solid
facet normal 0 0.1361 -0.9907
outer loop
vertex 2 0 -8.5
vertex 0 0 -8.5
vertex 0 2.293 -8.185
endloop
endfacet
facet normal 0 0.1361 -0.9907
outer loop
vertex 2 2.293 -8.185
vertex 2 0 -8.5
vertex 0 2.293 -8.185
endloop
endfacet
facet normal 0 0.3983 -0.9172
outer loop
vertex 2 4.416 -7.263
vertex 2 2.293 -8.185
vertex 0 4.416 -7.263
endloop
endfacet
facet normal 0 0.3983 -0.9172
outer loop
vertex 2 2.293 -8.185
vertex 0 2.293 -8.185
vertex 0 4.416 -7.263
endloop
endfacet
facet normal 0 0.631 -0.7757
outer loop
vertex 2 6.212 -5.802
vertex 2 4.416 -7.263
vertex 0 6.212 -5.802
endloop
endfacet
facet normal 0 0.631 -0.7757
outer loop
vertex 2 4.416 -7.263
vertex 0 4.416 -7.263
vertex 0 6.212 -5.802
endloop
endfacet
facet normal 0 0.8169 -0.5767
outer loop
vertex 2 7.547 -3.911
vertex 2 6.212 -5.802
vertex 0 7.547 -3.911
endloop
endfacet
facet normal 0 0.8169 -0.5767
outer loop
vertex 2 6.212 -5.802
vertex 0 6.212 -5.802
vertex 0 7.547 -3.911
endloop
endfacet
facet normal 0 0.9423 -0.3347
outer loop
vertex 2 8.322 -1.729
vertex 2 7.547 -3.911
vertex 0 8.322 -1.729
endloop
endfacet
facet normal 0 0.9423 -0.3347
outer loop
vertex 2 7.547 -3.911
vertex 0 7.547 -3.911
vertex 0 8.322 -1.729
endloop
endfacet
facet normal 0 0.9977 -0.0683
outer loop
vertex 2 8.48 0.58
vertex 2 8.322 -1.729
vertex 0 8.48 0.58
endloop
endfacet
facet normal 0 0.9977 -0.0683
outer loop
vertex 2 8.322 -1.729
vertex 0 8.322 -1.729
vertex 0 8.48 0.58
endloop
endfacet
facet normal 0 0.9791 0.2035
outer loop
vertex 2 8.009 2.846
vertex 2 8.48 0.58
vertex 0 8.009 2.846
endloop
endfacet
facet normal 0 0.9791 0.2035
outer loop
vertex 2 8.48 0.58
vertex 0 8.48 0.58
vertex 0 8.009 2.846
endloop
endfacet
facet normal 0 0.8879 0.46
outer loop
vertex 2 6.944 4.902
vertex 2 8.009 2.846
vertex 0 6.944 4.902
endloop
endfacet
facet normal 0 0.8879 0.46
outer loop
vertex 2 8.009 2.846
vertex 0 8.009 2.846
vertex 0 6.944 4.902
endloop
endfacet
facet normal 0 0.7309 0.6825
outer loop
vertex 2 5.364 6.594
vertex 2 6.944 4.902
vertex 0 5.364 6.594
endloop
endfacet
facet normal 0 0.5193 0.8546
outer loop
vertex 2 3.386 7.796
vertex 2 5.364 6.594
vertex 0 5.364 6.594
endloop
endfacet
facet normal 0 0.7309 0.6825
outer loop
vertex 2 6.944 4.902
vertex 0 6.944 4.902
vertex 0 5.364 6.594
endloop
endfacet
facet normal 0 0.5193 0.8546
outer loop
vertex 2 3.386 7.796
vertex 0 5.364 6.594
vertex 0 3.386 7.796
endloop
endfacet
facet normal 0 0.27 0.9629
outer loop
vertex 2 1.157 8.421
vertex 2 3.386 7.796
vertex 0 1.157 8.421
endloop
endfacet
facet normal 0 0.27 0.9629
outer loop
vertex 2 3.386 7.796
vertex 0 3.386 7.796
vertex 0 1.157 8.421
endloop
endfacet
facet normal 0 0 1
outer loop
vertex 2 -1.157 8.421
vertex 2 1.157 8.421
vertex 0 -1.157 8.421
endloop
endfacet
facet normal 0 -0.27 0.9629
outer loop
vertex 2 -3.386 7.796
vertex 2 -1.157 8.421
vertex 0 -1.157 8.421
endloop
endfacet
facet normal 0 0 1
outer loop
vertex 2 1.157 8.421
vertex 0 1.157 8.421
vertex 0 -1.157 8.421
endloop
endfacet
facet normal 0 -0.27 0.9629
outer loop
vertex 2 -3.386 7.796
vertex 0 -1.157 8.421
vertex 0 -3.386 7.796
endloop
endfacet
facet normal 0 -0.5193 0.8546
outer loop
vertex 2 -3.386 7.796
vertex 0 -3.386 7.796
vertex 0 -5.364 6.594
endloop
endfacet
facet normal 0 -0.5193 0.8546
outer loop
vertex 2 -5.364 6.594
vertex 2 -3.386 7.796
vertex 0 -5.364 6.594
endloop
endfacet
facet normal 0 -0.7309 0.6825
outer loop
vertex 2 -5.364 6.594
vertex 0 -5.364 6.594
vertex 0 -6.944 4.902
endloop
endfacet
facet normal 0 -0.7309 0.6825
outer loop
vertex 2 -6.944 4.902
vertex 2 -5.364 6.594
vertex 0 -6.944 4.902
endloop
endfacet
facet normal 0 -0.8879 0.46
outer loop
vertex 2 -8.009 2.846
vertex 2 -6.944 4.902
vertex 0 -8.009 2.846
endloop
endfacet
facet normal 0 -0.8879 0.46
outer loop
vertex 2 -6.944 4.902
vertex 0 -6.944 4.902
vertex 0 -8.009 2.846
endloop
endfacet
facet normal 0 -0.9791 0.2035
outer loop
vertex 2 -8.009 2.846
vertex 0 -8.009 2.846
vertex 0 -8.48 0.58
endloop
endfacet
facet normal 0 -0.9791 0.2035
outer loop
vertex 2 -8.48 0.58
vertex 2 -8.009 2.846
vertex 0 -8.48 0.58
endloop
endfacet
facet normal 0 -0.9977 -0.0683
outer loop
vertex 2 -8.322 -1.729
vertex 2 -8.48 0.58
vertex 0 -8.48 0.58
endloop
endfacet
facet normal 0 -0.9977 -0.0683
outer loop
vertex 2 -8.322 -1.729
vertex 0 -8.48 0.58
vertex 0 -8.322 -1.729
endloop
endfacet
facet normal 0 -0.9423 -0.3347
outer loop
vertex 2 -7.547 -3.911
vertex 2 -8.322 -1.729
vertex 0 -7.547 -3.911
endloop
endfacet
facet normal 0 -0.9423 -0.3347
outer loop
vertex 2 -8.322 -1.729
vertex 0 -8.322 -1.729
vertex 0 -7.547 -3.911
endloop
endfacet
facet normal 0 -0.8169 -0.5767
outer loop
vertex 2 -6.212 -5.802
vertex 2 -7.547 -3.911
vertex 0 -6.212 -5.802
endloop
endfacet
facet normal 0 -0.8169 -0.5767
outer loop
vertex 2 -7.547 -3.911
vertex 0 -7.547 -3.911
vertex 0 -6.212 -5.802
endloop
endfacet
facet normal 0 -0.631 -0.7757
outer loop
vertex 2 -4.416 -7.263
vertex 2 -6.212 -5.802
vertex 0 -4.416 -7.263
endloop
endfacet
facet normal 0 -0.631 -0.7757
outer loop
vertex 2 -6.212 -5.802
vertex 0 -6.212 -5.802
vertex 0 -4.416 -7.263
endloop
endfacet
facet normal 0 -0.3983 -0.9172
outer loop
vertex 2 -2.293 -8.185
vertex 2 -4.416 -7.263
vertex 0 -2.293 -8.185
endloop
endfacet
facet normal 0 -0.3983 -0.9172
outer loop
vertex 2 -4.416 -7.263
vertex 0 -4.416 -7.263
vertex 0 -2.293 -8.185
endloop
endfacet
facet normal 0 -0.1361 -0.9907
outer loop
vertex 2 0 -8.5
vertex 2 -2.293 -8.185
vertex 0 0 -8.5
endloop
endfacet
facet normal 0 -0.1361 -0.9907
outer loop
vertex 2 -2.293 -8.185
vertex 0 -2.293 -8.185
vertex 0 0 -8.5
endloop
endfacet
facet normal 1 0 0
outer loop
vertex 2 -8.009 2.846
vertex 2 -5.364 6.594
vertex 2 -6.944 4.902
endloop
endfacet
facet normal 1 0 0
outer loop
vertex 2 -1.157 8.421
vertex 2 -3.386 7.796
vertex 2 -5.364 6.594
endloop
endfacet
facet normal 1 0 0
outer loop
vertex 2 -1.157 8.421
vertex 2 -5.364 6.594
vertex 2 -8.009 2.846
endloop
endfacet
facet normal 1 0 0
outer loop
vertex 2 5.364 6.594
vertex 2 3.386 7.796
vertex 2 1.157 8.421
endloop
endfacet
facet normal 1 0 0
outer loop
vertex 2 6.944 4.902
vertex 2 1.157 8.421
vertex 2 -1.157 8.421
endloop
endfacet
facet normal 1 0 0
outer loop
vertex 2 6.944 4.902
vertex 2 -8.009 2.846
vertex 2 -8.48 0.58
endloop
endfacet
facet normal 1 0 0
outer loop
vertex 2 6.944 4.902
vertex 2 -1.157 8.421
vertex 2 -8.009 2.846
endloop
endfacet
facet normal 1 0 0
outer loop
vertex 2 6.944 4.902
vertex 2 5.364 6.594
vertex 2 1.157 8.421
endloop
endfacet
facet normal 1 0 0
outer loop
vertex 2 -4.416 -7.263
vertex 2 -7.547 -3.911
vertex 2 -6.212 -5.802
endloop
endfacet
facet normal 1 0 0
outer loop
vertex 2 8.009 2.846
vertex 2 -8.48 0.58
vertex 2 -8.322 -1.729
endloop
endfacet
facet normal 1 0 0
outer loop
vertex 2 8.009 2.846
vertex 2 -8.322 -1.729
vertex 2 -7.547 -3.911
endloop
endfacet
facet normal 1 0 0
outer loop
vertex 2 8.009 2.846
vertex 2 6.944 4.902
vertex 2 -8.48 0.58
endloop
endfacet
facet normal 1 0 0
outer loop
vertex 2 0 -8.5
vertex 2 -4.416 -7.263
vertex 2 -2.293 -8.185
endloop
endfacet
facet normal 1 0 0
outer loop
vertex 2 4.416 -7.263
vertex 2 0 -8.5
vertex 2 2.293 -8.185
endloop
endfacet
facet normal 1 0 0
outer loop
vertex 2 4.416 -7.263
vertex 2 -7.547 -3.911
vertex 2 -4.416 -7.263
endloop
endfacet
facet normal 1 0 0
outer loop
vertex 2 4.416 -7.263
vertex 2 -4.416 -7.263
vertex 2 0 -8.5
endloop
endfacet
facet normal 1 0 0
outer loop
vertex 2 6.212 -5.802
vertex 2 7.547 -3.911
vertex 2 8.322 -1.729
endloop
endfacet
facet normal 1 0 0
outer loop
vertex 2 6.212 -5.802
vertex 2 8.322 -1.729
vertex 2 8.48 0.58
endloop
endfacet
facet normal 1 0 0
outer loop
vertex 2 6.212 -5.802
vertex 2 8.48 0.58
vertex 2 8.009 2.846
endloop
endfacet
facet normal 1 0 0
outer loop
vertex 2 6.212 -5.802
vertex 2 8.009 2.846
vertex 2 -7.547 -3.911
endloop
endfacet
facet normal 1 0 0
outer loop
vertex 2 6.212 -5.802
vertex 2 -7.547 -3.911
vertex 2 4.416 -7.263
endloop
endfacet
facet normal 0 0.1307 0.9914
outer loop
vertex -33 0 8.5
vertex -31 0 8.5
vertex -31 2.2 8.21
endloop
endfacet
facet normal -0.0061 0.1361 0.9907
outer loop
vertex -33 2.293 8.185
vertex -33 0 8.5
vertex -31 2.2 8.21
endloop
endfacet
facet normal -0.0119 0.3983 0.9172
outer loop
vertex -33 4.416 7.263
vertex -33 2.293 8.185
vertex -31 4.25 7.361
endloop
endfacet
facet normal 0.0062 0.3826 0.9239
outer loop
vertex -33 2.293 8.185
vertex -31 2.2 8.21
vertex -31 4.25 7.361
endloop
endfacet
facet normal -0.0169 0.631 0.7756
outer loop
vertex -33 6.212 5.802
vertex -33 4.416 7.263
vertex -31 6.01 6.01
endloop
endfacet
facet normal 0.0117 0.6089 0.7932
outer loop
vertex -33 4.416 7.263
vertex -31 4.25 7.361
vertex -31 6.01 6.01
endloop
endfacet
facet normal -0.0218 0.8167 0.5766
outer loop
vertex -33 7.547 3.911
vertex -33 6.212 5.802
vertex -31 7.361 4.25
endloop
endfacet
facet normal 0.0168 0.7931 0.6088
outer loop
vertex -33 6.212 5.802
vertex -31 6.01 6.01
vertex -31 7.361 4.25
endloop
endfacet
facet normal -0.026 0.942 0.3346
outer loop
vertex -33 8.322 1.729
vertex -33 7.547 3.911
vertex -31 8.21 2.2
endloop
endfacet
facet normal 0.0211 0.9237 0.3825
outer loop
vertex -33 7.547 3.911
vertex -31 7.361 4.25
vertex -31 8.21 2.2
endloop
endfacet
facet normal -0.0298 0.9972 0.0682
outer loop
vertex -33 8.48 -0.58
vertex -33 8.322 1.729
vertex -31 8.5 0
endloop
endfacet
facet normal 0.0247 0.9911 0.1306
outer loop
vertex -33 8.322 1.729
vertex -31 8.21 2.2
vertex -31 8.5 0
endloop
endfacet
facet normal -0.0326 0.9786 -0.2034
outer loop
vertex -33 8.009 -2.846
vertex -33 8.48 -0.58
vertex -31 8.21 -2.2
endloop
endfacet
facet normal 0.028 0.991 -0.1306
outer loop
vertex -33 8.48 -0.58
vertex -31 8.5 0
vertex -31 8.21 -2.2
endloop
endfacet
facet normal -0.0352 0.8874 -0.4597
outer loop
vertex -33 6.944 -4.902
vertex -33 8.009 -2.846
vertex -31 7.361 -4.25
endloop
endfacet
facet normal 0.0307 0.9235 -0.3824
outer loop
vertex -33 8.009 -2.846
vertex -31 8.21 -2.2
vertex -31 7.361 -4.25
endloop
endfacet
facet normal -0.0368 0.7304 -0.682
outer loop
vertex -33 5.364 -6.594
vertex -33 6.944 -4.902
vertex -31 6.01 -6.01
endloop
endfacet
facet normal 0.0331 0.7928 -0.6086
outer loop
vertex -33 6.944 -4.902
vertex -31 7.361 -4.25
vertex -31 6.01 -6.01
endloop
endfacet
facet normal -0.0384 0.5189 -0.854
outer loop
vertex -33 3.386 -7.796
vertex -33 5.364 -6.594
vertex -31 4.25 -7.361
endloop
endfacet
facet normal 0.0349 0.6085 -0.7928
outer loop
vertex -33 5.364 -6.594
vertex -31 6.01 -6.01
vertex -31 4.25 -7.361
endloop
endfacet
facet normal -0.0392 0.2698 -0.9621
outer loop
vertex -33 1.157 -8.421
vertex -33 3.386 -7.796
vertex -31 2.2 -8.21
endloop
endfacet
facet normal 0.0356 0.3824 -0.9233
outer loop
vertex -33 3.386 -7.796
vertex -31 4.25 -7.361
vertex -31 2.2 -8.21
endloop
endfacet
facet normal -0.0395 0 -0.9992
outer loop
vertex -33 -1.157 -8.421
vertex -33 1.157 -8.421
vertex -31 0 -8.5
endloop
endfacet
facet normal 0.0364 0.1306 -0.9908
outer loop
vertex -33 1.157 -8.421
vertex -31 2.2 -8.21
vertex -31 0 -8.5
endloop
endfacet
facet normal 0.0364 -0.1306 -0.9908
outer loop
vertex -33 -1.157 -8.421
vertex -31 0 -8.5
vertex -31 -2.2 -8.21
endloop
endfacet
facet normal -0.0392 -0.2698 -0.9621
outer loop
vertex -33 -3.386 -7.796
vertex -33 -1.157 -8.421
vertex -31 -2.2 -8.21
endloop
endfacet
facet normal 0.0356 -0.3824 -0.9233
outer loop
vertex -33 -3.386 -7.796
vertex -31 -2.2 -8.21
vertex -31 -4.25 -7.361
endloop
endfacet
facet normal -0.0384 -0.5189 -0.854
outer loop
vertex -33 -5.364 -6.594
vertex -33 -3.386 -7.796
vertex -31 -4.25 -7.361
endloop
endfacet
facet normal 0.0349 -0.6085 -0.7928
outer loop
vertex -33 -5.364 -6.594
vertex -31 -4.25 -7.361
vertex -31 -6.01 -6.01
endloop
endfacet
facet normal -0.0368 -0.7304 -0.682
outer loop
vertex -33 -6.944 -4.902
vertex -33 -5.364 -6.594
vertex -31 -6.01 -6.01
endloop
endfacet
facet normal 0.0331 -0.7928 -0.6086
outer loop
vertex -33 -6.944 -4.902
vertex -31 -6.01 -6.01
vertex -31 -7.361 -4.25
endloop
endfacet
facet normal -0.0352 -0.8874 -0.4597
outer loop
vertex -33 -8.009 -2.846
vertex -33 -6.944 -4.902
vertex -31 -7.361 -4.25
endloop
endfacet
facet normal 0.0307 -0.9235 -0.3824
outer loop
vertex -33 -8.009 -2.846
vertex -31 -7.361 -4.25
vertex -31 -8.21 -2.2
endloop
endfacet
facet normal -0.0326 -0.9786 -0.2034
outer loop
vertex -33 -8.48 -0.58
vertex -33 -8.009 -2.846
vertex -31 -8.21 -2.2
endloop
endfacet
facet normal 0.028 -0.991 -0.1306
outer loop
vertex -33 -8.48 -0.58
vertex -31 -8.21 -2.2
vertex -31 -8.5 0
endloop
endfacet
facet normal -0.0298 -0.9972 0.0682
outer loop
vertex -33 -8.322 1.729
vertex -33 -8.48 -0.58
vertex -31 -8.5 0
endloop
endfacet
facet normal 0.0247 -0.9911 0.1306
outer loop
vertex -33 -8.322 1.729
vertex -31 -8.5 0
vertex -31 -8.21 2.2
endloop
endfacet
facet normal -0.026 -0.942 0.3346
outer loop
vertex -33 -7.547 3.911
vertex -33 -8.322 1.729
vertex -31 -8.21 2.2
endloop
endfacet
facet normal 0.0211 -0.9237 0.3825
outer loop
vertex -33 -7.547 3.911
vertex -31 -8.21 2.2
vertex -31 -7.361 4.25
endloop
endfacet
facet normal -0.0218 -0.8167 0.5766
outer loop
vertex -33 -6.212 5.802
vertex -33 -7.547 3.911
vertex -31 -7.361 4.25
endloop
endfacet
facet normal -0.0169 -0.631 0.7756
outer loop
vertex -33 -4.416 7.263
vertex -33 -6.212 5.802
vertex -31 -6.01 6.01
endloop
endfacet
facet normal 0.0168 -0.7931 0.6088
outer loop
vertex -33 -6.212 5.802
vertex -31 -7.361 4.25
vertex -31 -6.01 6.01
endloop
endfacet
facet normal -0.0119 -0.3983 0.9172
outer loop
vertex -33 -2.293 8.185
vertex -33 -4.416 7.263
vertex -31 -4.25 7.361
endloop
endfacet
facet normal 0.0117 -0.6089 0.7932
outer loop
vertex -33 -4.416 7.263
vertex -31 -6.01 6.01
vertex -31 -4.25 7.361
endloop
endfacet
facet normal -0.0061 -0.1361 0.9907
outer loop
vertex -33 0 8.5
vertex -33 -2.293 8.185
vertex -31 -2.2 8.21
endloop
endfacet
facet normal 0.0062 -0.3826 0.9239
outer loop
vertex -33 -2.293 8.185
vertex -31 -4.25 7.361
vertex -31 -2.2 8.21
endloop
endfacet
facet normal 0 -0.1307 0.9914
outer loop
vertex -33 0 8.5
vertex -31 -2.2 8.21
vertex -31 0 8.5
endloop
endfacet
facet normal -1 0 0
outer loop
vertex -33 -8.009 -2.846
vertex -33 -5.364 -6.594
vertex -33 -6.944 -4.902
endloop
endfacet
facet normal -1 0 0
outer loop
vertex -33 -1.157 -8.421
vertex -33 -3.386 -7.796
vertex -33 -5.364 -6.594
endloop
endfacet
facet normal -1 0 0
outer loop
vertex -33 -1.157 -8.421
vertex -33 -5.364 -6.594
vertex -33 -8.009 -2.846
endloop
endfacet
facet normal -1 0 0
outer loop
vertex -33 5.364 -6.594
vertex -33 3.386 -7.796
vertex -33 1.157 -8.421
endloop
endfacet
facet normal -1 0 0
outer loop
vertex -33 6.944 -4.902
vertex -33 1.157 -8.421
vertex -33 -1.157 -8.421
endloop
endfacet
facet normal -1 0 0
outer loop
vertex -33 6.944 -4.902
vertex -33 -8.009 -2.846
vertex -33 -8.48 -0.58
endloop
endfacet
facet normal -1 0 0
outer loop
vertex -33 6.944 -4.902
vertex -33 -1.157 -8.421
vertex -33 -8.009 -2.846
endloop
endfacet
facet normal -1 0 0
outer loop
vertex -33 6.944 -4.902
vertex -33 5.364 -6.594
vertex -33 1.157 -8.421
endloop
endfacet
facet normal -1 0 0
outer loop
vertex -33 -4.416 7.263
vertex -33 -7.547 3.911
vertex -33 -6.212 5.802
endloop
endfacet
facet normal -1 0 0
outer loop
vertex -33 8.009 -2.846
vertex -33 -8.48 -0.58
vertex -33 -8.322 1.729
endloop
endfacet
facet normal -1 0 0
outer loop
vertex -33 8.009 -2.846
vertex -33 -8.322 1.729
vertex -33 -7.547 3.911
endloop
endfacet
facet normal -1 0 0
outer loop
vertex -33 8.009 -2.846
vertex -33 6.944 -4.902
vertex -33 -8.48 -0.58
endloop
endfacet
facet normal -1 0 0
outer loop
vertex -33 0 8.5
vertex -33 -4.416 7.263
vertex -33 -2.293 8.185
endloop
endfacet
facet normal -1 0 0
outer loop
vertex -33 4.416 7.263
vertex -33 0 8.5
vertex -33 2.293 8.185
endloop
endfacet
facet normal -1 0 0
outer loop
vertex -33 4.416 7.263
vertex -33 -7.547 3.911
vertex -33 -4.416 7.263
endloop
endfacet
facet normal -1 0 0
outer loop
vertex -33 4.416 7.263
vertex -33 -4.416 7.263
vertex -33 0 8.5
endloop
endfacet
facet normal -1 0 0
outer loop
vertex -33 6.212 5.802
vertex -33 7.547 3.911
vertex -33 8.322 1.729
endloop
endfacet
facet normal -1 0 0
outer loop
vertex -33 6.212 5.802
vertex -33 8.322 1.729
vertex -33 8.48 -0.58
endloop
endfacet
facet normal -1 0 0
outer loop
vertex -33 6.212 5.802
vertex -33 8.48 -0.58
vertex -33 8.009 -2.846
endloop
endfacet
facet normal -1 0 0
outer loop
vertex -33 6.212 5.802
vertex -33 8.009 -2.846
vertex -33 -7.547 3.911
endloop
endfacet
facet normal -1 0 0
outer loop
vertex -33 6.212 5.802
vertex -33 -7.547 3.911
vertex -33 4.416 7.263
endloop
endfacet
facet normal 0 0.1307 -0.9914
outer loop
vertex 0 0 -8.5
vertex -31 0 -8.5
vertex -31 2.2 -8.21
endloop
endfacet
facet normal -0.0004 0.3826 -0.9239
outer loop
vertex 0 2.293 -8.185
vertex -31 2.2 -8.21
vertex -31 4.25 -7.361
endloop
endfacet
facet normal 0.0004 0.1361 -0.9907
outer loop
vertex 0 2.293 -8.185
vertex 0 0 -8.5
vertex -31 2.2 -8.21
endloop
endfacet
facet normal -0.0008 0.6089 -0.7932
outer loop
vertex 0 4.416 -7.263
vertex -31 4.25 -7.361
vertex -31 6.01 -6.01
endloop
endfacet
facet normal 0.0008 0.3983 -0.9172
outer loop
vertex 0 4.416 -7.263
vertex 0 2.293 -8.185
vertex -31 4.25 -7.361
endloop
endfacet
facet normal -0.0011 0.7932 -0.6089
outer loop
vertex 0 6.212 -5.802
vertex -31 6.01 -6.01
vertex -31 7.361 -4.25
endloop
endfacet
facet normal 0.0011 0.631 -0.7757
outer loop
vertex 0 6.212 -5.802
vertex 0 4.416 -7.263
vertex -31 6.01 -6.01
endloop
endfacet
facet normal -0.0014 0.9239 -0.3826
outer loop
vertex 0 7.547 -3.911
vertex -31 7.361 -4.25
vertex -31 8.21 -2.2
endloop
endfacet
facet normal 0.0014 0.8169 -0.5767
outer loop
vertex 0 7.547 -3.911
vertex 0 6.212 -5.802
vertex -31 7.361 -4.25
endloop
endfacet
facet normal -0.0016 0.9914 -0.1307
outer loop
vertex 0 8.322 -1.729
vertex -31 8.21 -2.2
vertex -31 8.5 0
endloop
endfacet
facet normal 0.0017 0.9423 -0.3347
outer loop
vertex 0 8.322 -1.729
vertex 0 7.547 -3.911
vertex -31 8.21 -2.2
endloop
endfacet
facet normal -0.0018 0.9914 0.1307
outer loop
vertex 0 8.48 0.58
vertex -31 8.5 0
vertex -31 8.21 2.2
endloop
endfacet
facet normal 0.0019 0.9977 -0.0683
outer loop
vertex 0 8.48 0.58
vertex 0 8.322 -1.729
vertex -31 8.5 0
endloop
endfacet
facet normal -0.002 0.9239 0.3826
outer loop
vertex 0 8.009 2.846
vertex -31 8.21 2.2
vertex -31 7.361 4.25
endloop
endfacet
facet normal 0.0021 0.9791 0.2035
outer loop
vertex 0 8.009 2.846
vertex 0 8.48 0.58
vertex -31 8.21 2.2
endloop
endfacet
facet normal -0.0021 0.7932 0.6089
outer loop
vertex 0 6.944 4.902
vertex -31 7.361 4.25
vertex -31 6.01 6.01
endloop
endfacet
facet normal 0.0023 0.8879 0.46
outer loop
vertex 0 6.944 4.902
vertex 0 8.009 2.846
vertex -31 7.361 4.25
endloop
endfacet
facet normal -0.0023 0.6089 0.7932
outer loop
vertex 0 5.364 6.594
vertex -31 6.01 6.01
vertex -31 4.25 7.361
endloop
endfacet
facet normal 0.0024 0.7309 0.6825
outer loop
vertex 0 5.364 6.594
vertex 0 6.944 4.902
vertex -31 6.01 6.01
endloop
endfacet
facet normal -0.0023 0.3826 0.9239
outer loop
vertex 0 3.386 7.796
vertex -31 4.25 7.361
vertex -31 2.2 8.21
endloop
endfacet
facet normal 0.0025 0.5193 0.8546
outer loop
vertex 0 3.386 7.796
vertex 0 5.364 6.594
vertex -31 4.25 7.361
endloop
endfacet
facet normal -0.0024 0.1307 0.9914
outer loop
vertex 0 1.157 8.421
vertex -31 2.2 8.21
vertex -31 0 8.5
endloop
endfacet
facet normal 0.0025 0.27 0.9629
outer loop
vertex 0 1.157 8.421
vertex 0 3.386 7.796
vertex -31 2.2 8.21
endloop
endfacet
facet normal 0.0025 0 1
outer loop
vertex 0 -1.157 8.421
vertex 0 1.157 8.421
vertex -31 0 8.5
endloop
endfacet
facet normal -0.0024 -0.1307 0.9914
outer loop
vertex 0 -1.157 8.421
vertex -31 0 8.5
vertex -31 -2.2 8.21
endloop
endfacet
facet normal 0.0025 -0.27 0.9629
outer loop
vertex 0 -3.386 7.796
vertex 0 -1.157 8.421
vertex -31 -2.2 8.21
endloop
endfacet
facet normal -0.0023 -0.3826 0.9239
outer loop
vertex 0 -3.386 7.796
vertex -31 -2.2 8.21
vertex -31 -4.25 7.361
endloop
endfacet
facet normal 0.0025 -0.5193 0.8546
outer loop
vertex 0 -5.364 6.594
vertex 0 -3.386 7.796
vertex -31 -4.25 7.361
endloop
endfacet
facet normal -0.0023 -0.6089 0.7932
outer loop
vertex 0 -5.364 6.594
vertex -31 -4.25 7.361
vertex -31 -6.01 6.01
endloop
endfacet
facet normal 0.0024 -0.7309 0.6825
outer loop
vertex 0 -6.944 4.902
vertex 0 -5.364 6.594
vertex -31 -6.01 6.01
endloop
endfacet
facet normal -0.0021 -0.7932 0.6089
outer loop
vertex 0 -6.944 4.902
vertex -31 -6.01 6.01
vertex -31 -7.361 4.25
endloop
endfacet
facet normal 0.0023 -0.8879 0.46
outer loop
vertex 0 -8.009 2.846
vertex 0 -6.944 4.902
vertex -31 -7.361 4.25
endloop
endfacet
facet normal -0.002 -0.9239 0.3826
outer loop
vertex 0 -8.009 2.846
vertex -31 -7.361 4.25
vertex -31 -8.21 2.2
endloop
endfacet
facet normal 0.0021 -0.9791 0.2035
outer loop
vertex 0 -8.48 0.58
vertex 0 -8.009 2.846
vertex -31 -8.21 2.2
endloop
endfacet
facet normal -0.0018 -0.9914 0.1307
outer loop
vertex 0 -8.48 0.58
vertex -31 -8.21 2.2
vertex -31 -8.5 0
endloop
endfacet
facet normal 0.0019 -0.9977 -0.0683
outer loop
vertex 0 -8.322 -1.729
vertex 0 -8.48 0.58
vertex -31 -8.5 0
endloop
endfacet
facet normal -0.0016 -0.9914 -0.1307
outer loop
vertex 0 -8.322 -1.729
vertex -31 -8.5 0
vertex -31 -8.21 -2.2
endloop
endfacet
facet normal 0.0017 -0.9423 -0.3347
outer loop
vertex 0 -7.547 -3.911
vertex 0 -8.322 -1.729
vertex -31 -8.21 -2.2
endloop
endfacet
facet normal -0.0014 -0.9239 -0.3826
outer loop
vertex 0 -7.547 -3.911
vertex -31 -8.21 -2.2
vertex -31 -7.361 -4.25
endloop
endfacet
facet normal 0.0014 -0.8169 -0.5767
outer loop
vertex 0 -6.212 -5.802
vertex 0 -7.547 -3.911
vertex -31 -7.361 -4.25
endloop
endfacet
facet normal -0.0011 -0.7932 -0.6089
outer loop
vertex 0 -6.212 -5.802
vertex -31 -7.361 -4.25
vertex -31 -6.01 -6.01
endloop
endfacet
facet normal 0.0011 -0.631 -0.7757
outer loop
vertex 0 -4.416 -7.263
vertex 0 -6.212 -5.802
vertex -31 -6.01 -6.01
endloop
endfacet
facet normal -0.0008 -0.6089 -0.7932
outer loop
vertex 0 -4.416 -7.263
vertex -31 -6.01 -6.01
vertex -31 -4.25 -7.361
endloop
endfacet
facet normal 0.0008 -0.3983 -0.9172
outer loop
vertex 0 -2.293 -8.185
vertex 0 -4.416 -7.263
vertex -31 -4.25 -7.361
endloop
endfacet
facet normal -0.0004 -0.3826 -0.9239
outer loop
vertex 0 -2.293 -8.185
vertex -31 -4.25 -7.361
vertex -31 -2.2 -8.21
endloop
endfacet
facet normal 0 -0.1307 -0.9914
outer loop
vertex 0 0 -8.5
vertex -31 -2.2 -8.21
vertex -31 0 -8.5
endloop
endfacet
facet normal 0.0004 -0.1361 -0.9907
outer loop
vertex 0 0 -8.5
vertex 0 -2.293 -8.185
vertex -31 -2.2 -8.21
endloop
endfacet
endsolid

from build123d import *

# Parameters (mm, degrees)
SKETCH1_R           = 8.5
BOSS_EXTRUDE1_DEPTH = 31
SKETCH1_2_R         = 8.5
BOSS_EXTRUDE2_DEPTH = 2
SKETCH2_R           = 8.5
BOSS_EXTRUDE3_DEPTH = 2


with BuildPart() as part:
    # Sketch1 → Boss-Extrude1 (new body)
    with BuildSketch(Plane(origin=(0, 0, 0), x_dir=(0, 0, -1), z_dir=(1, 0, 0))):
        Circle(SKETCH1_R)
    extrude(amount=-BOSS_EXTRUDE1_DEPTH)

    # Sketch1<2> → Boss-Extrude2 (add)
    with BuildSketch(Plane(origin=(0, 0, 0), x_dir=(0, 0, -1), z_dir=(1, 0, 0))):
        Circle(SKETCH1_2_R)
    extrude(amount=BOSS_EXTRUDE2_DEPTH)

    # Sketch2 → Boss-Extrude3 (add)
    with BuildSketch(Plane.ZY.offset(31)):
        Circle(SKETCH2_R)
    extrude(amount=BOSS_EXTRUDE3_DEPTH)


solid = part.part
